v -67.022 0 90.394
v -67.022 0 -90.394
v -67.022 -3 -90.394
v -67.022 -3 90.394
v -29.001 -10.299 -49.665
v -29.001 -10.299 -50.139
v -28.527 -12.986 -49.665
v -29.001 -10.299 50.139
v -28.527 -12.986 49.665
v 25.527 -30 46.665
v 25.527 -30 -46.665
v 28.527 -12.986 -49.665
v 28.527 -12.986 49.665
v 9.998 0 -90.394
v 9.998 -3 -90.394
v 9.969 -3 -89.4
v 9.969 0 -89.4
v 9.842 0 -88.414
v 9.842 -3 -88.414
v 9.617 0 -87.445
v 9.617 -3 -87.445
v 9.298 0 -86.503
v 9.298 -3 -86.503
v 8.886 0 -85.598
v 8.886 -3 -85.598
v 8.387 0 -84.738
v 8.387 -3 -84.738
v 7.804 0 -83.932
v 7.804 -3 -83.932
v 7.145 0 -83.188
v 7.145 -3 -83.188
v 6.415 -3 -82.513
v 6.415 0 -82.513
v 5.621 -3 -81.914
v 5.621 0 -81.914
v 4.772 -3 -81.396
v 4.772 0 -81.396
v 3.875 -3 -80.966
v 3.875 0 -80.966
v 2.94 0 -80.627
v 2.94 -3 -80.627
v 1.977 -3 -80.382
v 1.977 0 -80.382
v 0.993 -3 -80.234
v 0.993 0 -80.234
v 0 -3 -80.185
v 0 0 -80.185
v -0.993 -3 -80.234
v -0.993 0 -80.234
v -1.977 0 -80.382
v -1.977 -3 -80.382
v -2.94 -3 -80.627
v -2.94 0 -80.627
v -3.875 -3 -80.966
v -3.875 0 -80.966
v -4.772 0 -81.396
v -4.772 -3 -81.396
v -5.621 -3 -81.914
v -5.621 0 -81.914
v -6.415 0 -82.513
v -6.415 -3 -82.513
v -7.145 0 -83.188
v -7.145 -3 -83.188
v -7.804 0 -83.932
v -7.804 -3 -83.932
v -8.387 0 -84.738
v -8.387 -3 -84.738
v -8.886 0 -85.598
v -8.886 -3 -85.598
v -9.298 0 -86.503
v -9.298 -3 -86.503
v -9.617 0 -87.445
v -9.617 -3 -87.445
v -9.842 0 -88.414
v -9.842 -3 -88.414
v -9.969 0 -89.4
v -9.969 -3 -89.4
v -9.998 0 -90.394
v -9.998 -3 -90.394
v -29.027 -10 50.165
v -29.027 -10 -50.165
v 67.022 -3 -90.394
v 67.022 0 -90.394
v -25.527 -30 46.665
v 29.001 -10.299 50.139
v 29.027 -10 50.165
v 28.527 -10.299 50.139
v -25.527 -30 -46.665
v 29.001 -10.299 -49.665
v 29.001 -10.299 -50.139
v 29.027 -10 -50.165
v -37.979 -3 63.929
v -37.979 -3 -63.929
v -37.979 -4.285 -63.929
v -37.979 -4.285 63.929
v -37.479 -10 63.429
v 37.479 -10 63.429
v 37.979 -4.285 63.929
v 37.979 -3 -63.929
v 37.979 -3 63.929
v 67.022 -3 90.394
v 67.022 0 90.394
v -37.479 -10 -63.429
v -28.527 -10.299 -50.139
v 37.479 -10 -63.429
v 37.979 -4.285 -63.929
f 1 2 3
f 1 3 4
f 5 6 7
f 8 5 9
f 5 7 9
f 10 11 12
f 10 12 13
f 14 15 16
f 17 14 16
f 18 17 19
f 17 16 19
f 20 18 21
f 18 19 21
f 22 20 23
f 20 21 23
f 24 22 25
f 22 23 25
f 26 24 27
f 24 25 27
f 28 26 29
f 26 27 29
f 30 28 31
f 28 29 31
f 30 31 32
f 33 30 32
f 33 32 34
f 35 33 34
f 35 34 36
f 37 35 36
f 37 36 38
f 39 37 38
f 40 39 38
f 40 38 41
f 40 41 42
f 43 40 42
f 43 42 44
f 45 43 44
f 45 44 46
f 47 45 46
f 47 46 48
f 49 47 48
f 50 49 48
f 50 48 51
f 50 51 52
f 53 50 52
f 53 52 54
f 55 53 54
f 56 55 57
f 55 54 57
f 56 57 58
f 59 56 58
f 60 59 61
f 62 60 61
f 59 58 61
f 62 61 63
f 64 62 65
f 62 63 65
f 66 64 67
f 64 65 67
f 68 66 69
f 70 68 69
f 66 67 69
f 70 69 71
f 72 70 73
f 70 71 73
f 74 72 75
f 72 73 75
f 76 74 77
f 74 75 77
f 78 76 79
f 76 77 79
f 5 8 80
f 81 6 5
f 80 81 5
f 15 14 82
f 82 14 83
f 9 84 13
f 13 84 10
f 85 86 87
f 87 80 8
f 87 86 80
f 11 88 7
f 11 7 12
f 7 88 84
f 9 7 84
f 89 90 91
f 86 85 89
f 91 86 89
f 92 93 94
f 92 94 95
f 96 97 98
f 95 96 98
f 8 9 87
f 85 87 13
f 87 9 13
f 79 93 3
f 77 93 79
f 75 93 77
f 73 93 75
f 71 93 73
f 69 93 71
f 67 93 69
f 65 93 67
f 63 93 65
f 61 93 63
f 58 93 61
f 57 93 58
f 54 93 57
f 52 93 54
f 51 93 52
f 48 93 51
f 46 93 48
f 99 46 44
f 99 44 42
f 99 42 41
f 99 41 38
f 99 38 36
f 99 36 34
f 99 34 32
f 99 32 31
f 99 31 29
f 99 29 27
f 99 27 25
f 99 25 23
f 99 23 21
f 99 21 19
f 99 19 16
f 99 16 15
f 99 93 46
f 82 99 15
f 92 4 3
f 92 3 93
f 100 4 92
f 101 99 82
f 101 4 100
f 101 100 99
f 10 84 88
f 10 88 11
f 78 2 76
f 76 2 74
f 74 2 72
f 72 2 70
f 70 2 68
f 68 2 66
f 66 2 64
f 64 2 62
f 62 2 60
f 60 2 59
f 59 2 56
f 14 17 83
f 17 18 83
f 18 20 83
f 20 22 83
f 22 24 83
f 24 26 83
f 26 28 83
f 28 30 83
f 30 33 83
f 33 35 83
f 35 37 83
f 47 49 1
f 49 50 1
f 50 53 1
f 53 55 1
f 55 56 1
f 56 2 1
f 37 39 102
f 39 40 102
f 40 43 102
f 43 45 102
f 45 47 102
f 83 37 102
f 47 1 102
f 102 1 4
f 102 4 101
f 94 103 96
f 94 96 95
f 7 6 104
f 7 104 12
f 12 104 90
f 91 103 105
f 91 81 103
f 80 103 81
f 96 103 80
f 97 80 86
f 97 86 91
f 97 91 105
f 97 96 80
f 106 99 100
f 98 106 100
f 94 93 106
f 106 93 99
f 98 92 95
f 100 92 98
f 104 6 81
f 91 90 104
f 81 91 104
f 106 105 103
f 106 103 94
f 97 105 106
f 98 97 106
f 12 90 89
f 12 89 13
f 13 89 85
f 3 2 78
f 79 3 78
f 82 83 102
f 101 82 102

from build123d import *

# Parameters (mm, degrees)
F0_W         = 57.0548474789
F0_H         = 99.3303954601
F1_DEPTH     = 30
F0_W_2       = 75.9585499763
F0_H_2       = 127.8578191996
F2_DEPTH     = 10
F3_C1_SIZE2  = 3
F3_C1_SIZE   = 17.0138454589
F3_C2_SIZE2  = 3
F3_C2_SIZE   = 17.0138454589
F3_C3_SIZE2  = 3
F3_C3_SIZE   = 17.0138454589
F3_C4_SIZE2  = 3
F3_C4_SIZE   = 17.0138454589
F4_T4_DEPTH  = 57.0548474789
F4_T9_DEPTH  = 99.3303954601
F4_T14_DEPTH = 57.0548474789
F4_T19_DEPTH = 99.3303954601
F4_T25_DEPTH = 114.1873722104
F4_T31_DEPTH = 71.9118242292
F4_T40_DEPTH = 114.1873722104
F4_T46_DEPTH = 71.9118242292
F4_T55_DEPTH = 71.9118242292
F4_T61_DEPTH = 114.1873722104
F4_T70_DEPTH = 71.9118242292
F4_T76_DEPTH = 114.1873722104
F4_T81_DEPTH = 157.5717727001
F4_T83_DEPTH = 105.6725034769
F0_W_3       = 134.0444982052
F0_H_3       = 180.7882040739
F5_DEPTH     = 3
F7_D         = 20


# Not quite as in the source:
# - a fillet or chamfer that OpenCascade refuses, or shapes differently, is made with other operations: its cross-section is extruded or revolved along the edge and cut away or added


with BuildPart() as f1:
    # F0 (on Front) → F1 (new body)
    with BuildSketch(Plane.XZ):
        Rectangle(F0_W, F0_H)
    extrude(amount=F1_DEPTH)

    # F0 (on Front) → F2 (join)
    with BuildSketch(Plane.XZ):
        Rectangle(F0_W_2, F0_H_2)
        Rectangle(F0_W, F0_H, mode=Mode.SUBTRACT)
    extrude(amount=F2_DEPTH)

    # F3: chamfer of 3 x 17.0138454589 on 4 edges, made by hand

    # F3_c1
    f3_c1_edges = [f1.edges().sort_by_distance(p)[0] for p in [
        (28.5274237394, -30, 0),
    ]]
    f3_c1_side = f1.faces().sort_by_distance((28.5274237394, -29.94, 0))[0]
    chamfer(f3_c1_edges, length=F3_C1_SIZE, length2=F3_C1_SIZE2, reference=f3_c1_side)

    # F3_c2
    f3_c2_edges = [f1.edges().sort_by_distance(p)[0] for p in [
        (-1.5, -30, 49.6651977301),
    ]]
    f3_c2_side = f1.faces().sort_by_distance((-1.5, -29.94, 49.6651977301))[0]
    chamfer(f3_c2_edges, length=F3_C2_SIZE, length2=F3_C2_SIZE2, reference=f3_c2_side)

    # F3_c3
    f3_c3_edges = [f1.edges().sort_by_distance(p)[0] for p in [
        (-28.5274237394, -30, -1.5),
    ]]
    f3_c3_side = f1.faces().sort_by_distance((-28.5274237394, -29.94, -1.5))[0]
    chamfer(f3_c3_edges, length=F3_C3_SIZE, length2=F3_C3_SIZE2, reference=f3_c3_side)

    # F3_c4
    f3_c4_edges = [f1.edges().sort_by_distance(p)[0] for p in [
        (0, -30, -49.6651977301),
    ]]
    f3_c4_side = f1.faces().sort_by_distance((0, -29.94, -49.6651977301))[0]
    chamfer(f3_c4_edges, length=F3_C4_SIZE, length2=F3_C4_SIZE2, reference=f3_c4_side)

    # F4: chamfer of 0.5 x 5.7150261514 on 8 edges, made by hand


with BuildPart() as f4_tool2:
    # F4_s3 → F4_t4 (new body)
    with BuildSketch(Plane.YZ.offset(-28.5274237394)):
        Polygon((-10, 50.1651977301), (-15.7150261514, 49.6651977301), (-10, 49.6651977301), align=None)
    extrude(amount=F4_T4_DEPTH)

    split(bisect_by=Plane(origin=(0, -8.8848294962, 50.3883719921), x_dir=(1, 0, 0), z_dir=(0, 0.1736481777, -0.984807753)), keep=Keep.TOP)


with BuildPart() as f1_1:
    add(f1.part)

    # F4_t1: union F4_tool2
    add(f4_tool2.part)


with BuildPart() as f4_tool7:
    # F4_s8 → F4_t9 (new body)
    with BuildSketch(Plane.XY.offset(49.6651977301)):
        Polygon((28.5274237394, -15.7150261514), (29.0274237394, -10), (28.5274237394, -10), align=None)
    extrude(amount=-F4_T9_DEPTH)

    split(bisect_by=Plane(origin=(29.8879798774, -5.2700572513, 0), x_dir=(0, 0, 1), z_dir=(-0.984807753, 0.1736481777, 0)), keep=Keep.TOP)


with BuildPart() as f1_2:
    add(f1_1.part)

    # F4_t6: union F4_tool7
    add(f4_tool7.part)


with BuildPart() as f4_tool12:
    # F4_s13 → F4_t14 (new body)
    with BuildSketch(Plane.YZ.offset(28.5274237394)):
        Polygon((-15.7150261514, -49.6651977301), (-10, -50.1651977301), (-10, -49.6651977301), align=None)
    extrude(amount=-F4_T14_DEPTH)

    split(bisect_by=Plane(origin=(0, -8.8848294962, -50.3883719921), x_dir=(1, 0, 0), z_dir=(0, 0.1736481777, 0.984807753)), keep=Keep.TOP)


with BuildPart() as f1_3:
    add(f1_2.part)

    # F4_t11: union F4_tool12
    add(f4_tool12.part)


with BuildPart() as f4_tool17:
    # F4_s18 → F4_t19 (new body)
    with BuildSketch(Plane.XY.offset(-49.6651977301)):
        Polygon((-28.5274237394, -15.7150261514), (-29.0274237394, -10), (-28.5274237394, -10), align=None)
    extrude(amount=F4_T19_DEPTH)

    split(bisect_by=Plane(origin=(-29.8879798774, -5.2700572513, 0), x_dir=(0, 0, 1), z_dir=(0.984807753, 0.1736481777, 0)), keep=Keep.TOP)


with BuildPart() as f1_4:
    add(f1_3.part)

    # F4_t16: union F4_tool17
    add(f4_tool17.part)


with BuildPart() as f4_tool23:
    # F4_s24 → F4_t25 (new body)
    with BuildSketch(Plane.XY.offset(-49.6651977301)):
        Polygon((-28.5274237394, -15.7150261514), (-29.0274237394, -10), (-28.5274237394, -10), align=None)
    extrude(amount=F4_T25_DEPTH)

    split(bisect_by=Plane(origin=(-29.8879798774, -5.2700572513, 0), x_dir=(0, 0, 1), z_dir=(0.984807753, 0.1736481777, 0)), keep=Keep.TOP)

    split(bisect_by=Plane.XY.offset(49.6651977301), keep=Keep.TOP)

    split(bisect_by=Plane.XY.offset(63.9289095998), keep=Keep.BOTTOM)


with BuildPart() as f4_tool29:
    # F4_s30 → F4_t31 (new body)
    with BuildSketch(Plane.YZ.offset(-43.3844004897)):
        Polygon((-10, 50.1651977301), (-15.7150261514, 49.6651977301), (-10, 49.6651977301), align=None)
    extrude(amount=F4_T31_DEPTH)

    split(bisect_by=Plane.YZ.offset(-28.5274237394), keep=Keep.BOTTOM)

    split(bisect_by=Plane.YZ.offset(-37.9792749882), keep=Keep.TOP)

    split(bisect_by=Plane(origin=(0, -8.8848294962, 50.3883719921), x_dir=(1, 0, 0), z_dir=(0, 0.1736481777, -0.984807753)), keep=Keep.TOP)


with BuildPart() as f4_tool23_1:
    add(f4_tool23.part)

    # F4_t35: intersect F4_tool29
    add(f4_tool29.part, mode=Mode.INTERSECT)


with BuildPart() as f1_5:
    add(f1_4.part)

    # F4_t21: union F4_tool23
    add(f4_tool23_1.part)


with BuildPart() as f4_tool38:
    # F4_s39 → F4_t40 (new body)
    with BuildSketch(Plane.XY.offset(64.5221744803)):
        Polygon((28.5274237394, -15.7150261514), (29.0274237394, -10), (28.5274237394, -10), align=None)
    extrude(amount=-F4_T40_DEPTH)

    split(bisect_by=Plane.XY.offset(49.6651977301), keep=Keep.TOP)

    split(bisect_by=Plane(origin=(29.8879798774, -5.2700572513, 0), x_dir=(0, 0, 1), z_dir=(-0.984807753, 0.1736481777, 0)), keep=Keep.TOP)

    split(bisect_by=Plane.XY.offset(63.9289095998), keep=Keep.BOTTOM)


with BuildPart() as f4_tool44:
    # F4_s45 → F4_t46 (new body)
    with BuildSketch(Plane.YZ.offset(-28.5274237394)):
        Polygon((-10, 50.1651977301), (-15.7150261514, 49.6651977301), (-10, 49.6651977301), align=None)
    extrude(amount=F4_T46_DEPTH)

    split(bisect_by=Plane.YZ.offset(28.5274237394), keep=Keep.TOP)

    split(bisect_by=Plane.YZ.offset(37.9792749882), keep=Keep.BOTTOM)

    split(bisect_by=Plane(origin=(0, -8.8848294962, 50.3883719921), x_dir=(1, 0, 0), z_dir=(0, 0.1736481777, -0.984807753)), keep=Keep.TOP)


with BuildPart() as f4_tool38_1:
    add(f4_tool38.part)

    # F4_t50: intersect F4_tool44
    add(f4_tool44.part, mode=Mode.INTERSECT)


with BuildPart() as f1_6:
    add(f1_5.part)

    # F4_t36: union F4_tool38
    add(f4_tool38_1.part)


with BuildPart() as f4_tool53:
    # F4_s54 → F4_t55 (new body)
    with BuildSketch(Plane.YZ.offset(43.3844004897)):
        Polygon((-15.7150261514, -49.6651977301), (-10, -50.1651977301), (-10, -49.6651977301), align=None)
    extrude(amount=-F4_T55_DEPTH)

    split(bisect_by=Plane(origin=(0, -8.8848294962, -50.3883719921), x_dir=(1, 0, 0), z_dir=(0, 0.1736481777, 0.984807753)), keep=Keep.TOP)

    split(bisect_by=Plane.YZ.offset(28.5274237394), keep=Keep.TOP)

    split(bisect_by=Plane.YZ.offset(37.9792749882), keep=Keep.BOTTOM)


with BuildPart() as f4_tool59:
    # F4_s60 → F4_t61 (new body)
    with BuildSketch(Plane.XY.offset(49.6651977301)):
        Polygon((28.5274237394, -15.7150261514), (29.0274237394, -10), (28.5274237394, -10), align=None)
    extrude(amount=-F4_T61_DEPTH)

    split(bisect_by=Plane.XY.offset(-49.6651977301), keep=Keep.BOTTOM)

    split(bisect_by=Plane(origin=(29.8879798774, -5.2700572513, 0), x_dir=(0, 0, 1), z_dir=(-0.984807753, 0.1736481777, 0)), keep=Keep.TOP)

    split(bisect_by=Plane.XY.offset(-63.9289095998), keep=Keep.TOP)


with BuildPart() as f4_tool53_1:
    add(f4_tool53.part)

    # F4_t65: intersect F4_tool59
    add(f4_tool59.part, mode=Mode.INTERSECT)


with BuildPart() as f1_7:
    add(f1_6.part)

    # F4_t51: union F4_tool53
    add(f4_tool53_1.part)


with BuildPart() as f4_tool68:
    # F4_s69 → F4_t70 (new body)
    with BuildSketch(Plane.YZ.offset(28.5274237394)):
        Polygon((-15.7150261514, -49.6651977301), (-10, -50.1651977301), (-10, -49.6651977301), align=None)
    extrude(amount=-F4_T70_DEPTH)

    split(bisect_by=Plane(origin=(0, -8.8848294962, -50.3883719921), x_dir=(1, 0, 0), z_dir=(0, 0.1736481777, 0.984807753)), keep=Keep.TOP)

    split(bisect_by=Plane.YZ.offset(-28.5274237394), keep=Keep.BOTTOM)

    split(bisect_by=Plane.YZ.offset(-37.9792749882), keep=Keep.TOP)


with BuildPart() as f4_tool74:
    # F4_s75 → F4_t76 (new body)
    with BuildSketch(Plane.XY.offset(-64.5221744803)):
        Polygon((-28.5274237394, -15.7150261514), (-29.0274237394, -10), (-28.5274237394, -10), align=None)
    extrude(amount=F4_T76_DEPTH)

    split(bisect_by=Plane.XY.offset(-49.6651977301), keep=Keep.BOTTOM)

    split(bisect_by=Plane(origin=(-29.8879798774, -5.2700572513, 0), x_dir=(0, 0, 1), z_dir=(0.984807753, 0.1736481777, 0)), keep=Keep.TOP)

    split(bisect_by=Plane.XY.offset(-63.9289095998), keep=Keep.TOP)


with BuildPart() as f4_tool68_1:
    add(f4_tool68.part)

    # F4_t80: intersect F4_tool74
    add(f4_tool74.part, mode=Mode.INTERSECT)


with BuildPart() as f1_8:
    add(f1_7.part)

    # F4_t66: union F4_tool68
    add(f4_tool68_1.part)

    # F4_s82 → F4_t81 (cut)
    with BuildSketch(Plane.XY.offset(-78.7858863501)):
        Polygon((37.4792749882, -10), (37.9792749882, -4.2849738486), (37.9792749882, -10), align=None)
        Polygon((-37.4792749882, -10), (-37.9792749882, -4.2849738486), (-37.9792749882, -10), align=None)
    extrude(amount=F4_T81_DEPTH, mode=Mode.SUBTRACT)

    # F4_s84 → F4_t83 (cut)
    with BuildSketch(Plane.YZ.offset(-52.8362517385)):
        Polygon((-10, 63.4289095998), (-4.2849738486, 63.9289095998), (-10, 63.9289095998), align=None)
        Polygon((-10, -63.4289095998), (-4.2849738486, -63.9289095998), (-10, -63.9289095998), align=None)
    extrude(amount=F4_T83_DEPTH, mode=Mode.SUBTRACT)

    # F0 (on Front) → F5 (join)
    with BuildSketch(Plane.XZ):
        Rectangle(F0_W_3, F0_H_3)
        Rectangle(F0_W_2, F0_H_2, mode=Mode.SUBTRACT)
    extrude(amount=F5_DEPTH)

    # F7 (through all)
    with Locations(Plane(origin=(0, 0, 0), x_dir=(1, 0, 0), z_dir=(0, 1, 0))):
        with Locations((0, 90.1845097542)):
            Hole(F7_D / 2)


solid = f1_8.part
